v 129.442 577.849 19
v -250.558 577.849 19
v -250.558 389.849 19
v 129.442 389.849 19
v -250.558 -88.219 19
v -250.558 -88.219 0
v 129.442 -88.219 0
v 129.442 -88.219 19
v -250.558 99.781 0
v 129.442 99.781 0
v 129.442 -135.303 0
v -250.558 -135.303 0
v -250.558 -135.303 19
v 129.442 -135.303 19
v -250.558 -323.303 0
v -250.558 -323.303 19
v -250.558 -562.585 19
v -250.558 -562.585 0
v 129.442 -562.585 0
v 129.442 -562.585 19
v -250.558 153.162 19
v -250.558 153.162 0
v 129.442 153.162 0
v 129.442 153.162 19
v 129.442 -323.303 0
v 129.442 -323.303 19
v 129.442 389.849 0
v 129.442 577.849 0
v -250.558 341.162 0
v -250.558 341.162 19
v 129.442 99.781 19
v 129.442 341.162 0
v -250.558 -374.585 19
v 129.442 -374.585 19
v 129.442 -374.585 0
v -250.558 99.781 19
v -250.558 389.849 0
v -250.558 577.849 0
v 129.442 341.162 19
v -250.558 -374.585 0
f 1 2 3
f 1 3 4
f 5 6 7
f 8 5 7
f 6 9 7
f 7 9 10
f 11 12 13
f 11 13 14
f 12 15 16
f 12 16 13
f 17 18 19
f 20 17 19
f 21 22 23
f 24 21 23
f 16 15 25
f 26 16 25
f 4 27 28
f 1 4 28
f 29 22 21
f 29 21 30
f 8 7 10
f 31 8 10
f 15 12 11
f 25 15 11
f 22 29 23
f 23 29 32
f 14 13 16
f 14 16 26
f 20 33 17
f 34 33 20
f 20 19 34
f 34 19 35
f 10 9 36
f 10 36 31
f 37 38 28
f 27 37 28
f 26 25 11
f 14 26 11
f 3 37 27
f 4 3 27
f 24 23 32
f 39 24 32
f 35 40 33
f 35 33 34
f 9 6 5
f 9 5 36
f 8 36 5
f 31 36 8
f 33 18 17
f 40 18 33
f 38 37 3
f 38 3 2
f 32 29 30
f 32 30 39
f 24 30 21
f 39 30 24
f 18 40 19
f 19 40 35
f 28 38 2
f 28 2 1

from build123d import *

# Parameters (mm, degrees)
F0_W     = 380
F0_H     = 188
F1_DEPTH = 19
F2_DEPTH = 18


with BuildPart() as f1:
    # F0 (on Top) → F1 (new body)
    with BuildSketch(Plane.XY):
        with Locations((-60.5580484867, 247.1623601913)):
            Rectangle(F0_W, F0_H)
    extrude(amount=F1_DEPTH)

    # F0 (on Top) → F2, piece 2 (join)
    with BuildSketch(Plane.XY):
        with Locations((-60.5580484867, 247.1623601913)):
            Rectangle(F0_W, F0_H)
    extrude(amount=F2_DEPTH)


with BuildPart() as f1b:
    # F0 (on Top) → F1, piece 2 (new body)
    with BuildSketch(Plane.XY):
        with Locations((-60.5580484867, 483.8489773273)):
            Rectangle(F0_W, F0_H)
    extrude(amount=F1_DEPTH)

    # F0 (on Top) → F2 (join)
    with BuildSketch(Plane.XY):
        with Locations((-60.5580484867, 483.8489773273)):
            Rectangle(F0_W, F0_H)
    extrude(amount=F2_DEPTH)


with BuildPart() as f1c:
    # F0 (on Top) → F1, piece 3 (new body)
    with BuildSketch(Plane.XY):
        with Locations((-60.5580484867, 5.7811396718)):
            Rectangle(F0_W, F0_H)
    extrude(amount=F1_DEPTH)

    # F0 (on Top) → F2, piece 3 (join)
    with BuildSketch(Plane.XY):
        with Locations((-60.5580484867, 5.7811396718)):
            Rectangle(F0_W, F0_H)
    extrude(amount=F2_DEPTH)


with BuildPart() as f1d:
    # F0 (on Top) → F1, piece 4 (new body)
    with BuildSketch(Plane.XY):
        with Locations((-60.5580484867, -229.3031630516)):
            Rectangle(F0_W, F0_H)
    extrude(amount=F1_DEPTH)

    # F0 (on Top) → F2, piece 4 (join)
    with BuildSketch(Plane.XY):
        with Locations((-60.5580484867, -229.3031630516)):
            Rectangle(F0_W, F0_H)
    extrude(amount=F2_DEPTH)


with BuildPart() as f1e:
    # F0 (on Top) → F1, piece 5 (new body)
    with BuildSketch(Plane.XY):
        with Locations((-60.5580484867, -468.5854730606)):
            Rectangle(F0_W, F0_H)
    extrude(amount=F1_DEPTH)

    # F0 (on Top) → F2, piece 5 (join)
    with BuildSketch(Plane.XY):
        with Locations((-60.5580484867, -468.5854730606)):
            Rectangle(F0_W, F0_H)
    extrude(amount=F2_DEPTH)


solid = Compound([f1.part, f1b.part, f1c.part, f1d.part, f1e.part])
